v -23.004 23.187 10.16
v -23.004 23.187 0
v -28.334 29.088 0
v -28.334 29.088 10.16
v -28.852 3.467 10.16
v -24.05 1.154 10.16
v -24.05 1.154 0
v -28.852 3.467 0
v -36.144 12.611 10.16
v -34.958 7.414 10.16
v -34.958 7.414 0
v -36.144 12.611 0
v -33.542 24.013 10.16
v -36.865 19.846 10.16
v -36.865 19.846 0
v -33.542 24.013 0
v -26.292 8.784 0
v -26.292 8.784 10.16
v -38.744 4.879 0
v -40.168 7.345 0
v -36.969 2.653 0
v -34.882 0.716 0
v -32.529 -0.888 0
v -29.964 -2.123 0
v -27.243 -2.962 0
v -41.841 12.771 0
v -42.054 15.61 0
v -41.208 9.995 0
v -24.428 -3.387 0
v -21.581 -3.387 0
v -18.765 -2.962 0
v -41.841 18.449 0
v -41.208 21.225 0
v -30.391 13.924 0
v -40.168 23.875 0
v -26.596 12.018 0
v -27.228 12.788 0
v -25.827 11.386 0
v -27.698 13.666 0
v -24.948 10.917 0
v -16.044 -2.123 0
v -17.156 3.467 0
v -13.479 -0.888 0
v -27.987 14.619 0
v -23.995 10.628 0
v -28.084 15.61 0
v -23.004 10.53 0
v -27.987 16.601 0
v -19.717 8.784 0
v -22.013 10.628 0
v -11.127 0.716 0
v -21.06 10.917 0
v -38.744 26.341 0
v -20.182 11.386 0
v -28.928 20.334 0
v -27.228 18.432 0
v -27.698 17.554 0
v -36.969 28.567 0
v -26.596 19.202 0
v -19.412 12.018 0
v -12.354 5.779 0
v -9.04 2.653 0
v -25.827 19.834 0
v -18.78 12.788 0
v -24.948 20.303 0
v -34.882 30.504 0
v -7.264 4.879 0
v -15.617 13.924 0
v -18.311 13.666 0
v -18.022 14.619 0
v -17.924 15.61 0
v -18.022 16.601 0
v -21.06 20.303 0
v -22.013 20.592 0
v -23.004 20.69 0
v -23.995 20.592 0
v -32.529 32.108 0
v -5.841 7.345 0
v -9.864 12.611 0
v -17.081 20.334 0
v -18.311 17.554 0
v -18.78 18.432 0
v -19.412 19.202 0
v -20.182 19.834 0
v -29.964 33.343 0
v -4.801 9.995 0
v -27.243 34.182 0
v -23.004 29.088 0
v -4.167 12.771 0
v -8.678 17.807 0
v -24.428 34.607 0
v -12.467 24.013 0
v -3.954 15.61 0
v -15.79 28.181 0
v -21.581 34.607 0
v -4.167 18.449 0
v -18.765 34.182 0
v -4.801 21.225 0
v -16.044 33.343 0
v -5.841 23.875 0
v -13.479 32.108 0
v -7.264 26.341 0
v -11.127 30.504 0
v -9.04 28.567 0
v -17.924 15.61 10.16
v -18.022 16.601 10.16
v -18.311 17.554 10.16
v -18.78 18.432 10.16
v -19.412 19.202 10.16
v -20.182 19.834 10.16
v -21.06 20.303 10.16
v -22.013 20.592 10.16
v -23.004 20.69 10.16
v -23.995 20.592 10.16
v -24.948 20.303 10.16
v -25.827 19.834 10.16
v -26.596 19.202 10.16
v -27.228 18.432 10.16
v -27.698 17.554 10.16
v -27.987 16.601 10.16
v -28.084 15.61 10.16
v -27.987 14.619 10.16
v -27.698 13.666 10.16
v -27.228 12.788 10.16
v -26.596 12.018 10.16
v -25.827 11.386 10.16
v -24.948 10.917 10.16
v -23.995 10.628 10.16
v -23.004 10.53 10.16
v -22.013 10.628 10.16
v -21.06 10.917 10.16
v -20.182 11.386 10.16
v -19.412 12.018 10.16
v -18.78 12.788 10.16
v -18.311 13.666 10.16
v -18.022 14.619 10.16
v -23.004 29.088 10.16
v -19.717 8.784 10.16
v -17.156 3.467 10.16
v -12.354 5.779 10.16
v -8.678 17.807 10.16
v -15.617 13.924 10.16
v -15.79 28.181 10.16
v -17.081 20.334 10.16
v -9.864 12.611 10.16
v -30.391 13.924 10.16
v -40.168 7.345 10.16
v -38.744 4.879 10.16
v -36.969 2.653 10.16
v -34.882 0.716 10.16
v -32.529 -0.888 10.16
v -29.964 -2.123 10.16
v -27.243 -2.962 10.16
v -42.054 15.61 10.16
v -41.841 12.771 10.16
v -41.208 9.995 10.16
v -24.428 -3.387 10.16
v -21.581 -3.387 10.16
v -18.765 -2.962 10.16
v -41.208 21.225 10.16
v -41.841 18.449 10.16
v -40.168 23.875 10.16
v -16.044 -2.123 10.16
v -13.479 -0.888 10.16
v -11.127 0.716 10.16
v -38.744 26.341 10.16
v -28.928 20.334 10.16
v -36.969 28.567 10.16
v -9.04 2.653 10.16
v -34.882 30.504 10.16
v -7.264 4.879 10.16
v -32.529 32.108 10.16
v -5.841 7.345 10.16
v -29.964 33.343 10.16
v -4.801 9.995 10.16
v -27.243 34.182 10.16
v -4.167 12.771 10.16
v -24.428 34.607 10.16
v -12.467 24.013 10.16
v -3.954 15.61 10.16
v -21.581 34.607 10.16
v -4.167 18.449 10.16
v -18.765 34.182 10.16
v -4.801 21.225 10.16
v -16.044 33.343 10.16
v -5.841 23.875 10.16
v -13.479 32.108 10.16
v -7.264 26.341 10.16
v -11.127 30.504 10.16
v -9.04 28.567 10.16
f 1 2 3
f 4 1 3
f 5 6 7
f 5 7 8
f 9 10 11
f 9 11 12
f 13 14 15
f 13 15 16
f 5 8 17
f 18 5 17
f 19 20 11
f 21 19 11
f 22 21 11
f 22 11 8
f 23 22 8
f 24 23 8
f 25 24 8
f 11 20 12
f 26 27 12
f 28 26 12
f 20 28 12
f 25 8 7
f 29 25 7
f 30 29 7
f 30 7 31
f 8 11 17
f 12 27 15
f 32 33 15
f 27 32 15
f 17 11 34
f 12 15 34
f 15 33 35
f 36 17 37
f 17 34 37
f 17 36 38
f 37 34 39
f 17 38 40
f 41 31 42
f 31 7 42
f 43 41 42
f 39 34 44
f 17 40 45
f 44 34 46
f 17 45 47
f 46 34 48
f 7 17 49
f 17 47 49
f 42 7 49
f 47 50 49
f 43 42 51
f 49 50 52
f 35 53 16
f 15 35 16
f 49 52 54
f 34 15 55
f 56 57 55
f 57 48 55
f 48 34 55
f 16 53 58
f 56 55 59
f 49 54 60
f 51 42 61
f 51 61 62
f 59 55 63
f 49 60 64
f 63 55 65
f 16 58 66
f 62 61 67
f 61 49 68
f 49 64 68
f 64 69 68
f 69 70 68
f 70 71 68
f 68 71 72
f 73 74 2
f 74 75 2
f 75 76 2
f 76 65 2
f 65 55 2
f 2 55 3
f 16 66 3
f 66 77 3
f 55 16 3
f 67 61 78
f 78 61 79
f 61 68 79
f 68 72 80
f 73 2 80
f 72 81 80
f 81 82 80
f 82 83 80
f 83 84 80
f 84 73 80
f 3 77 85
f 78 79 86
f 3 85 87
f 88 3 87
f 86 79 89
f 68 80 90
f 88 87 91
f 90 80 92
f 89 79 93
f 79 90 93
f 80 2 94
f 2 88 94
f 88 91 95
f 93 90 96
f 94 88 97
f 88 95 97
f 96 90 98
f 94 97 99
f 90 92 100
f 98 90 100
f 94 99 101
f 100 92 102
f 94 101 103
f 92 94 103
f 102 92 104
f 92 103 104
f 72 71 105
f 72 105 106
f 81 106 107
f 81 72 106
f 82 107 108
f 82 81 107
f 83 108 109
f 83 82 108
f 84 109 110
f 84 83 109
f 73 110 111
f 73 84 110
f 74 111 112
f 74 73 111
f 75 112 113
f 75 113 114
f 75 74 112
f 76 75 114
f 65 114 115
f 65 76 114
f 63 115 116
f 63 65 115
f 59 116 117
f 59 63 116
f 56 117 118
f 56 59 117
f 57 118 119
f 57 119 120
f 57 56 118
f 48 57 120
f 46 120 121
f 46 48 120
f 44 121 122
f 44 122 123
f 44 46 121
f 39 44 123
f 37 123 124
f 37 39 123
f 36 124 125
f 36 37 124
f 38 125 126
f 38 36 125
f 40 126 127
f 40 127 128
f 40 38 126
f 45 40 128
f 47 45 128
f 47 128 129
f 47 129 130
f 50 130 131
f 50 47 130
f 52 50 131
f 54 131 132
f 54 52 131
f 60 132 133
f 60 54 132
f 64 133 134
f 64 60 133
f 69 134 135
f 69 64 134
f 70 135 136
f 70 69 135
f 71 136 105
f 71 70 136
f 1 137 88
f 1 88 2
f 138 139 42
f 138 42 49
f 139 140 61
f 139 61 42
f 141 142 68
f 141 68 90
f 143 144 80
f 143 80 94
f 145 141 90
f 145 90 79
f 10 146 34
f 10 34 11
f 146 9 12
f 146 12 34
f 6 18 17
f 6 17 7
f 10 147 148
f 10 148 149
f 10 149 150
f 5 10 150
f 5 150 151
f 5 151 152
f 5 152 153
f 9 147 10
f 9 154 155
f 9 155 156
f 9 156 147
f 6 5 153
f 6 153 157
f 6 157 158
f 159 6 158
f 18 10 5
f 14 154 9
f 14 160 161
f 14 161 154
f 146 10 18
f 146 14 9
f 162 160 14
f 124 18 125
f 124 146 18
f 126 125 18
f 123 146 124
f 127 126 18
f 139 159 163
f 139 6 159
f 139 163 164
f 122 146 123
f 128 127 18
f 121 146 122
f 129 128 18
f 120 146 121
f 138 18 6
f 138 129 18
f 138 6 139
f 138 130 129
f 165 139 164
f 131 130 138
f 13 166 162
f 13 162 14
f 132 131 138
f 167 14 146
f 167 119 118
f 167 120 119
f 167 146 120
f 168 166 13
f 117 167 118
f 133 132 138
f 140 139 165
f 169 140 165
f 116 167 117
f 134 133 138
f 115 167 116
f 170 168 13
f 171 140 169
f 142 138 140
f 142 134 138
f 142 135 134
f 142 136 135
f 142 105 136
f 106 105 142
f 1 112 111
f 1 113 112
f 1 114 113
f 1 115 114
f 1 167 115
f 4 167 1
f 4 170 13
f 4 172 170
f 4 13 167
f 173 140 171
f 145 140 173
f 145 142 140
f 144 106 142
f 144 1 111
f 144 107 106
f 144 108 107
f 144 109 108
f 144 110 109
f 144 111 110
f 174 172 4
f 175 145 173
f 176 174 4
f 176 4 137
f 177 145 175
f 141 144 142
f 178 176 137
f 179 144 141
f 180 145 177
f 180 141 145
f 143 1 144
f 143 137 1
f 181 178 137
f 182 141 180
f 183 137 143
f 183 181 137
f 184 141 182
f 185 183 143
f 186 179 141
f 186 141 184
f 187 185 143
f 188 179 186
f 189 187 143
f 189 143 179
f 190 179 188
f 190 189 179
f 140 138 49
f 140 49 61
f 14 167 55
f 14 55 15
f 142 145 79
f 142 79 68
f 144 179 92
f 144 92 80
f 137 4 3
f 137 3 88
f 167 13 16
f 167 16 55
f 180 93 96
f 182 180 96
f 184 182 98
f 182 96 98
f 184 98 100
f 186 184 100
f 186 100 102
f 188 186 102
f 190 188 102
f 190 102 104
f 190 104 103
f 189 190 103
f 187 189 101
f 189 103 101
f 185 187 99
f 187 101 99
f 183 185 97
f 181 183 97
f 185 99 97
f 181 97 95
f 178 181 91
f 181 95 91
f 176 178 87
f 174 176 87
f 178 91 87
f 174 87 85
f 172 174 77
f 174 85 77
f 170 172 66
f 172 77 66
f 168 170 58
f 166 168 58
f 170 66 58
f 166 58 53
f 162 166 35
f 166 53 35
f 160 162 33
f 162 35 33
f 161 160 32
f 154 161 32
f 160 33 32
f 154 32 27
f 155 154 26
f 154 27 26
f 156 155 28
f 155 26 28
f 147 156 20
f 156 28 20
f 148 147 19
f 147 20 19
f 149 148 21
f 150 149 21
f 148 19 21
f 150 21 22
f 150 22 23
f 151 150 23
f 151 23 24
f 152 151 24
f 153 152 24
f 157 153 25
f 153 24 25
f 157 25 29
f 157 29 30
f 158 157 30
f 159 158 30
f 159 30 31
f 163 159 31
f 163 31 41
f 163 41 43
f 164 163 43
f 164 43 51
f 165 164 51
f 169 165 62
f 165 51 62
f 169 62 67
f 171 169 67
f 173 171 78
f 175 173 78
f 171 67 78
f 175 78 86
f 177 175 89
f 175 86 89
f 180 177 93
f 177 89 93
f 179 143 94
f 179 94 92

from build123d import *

# Parameters (mm, degrees)
SKETCH1_R           = 19.05
SKETCH1_R_2         = 5.08
BOSS_EXTRUDE2_DEPTH = 10.16
CUT_EXTRUDE2_DEPTH  = 10.16


with BuildPart() as part:
    # Sketch1 → Boss-Extrude2 (new body)
    with BuildSketch(Plane.XY):
        with Locations((-23.004204789, 15.609996107)):
            Circle(SKETCH1_R)
        with Locations((-23.004204789, 15.609996107)):
            Circle(SKETCH1_R_2, mode=Mode.SUBTRACT)
    extrude(amount=BOSS_EXTRUDE2_DEPTH)

    # Sketch3 → Cut-Extrude2 (cut)
    with BuildSketch(Plane.XY.offset(10.16)):
        Polygon((-23.004204789, 23.186689095), (-28.334456331, 29.08814957), (-23.004204789, 29.08814957), align=None)
        Polygon((-12.466560086, 24.013487339), (-17.080507678, 20.333986917), (-15.789917564, 28.180845804), align=None)
        Polygon((-9.863976773, 12.61082481), (-15.617475313, 13.924023307), (-8.677884222, 17.807435817), align=None)
        Polygon((-17.156253168, 3.46659944), (-19.716800906, 8.783631603), (-12.353862471, 5.779308909), align=None)
        Polygon((-28.85215641, 3.46659944), (-26.291608673, 8.783631603), (-24.049765713, 1.153889971), align=None)
        Polygon((-36.144432805, 12.61082481), (-30.390934265, 13.924023307), (-34.958340254, 7.414213804), align=None)
        Polygon((-33.541849492, 24.013487339), (-28.9279019, 20.333986917), (-36.86520697, 19.846128875), align=None)
    extrude(amount=-CUT_EXTRUDE2_DEPTH, mode=Mode.SUBTRACT)


solid = part.part
